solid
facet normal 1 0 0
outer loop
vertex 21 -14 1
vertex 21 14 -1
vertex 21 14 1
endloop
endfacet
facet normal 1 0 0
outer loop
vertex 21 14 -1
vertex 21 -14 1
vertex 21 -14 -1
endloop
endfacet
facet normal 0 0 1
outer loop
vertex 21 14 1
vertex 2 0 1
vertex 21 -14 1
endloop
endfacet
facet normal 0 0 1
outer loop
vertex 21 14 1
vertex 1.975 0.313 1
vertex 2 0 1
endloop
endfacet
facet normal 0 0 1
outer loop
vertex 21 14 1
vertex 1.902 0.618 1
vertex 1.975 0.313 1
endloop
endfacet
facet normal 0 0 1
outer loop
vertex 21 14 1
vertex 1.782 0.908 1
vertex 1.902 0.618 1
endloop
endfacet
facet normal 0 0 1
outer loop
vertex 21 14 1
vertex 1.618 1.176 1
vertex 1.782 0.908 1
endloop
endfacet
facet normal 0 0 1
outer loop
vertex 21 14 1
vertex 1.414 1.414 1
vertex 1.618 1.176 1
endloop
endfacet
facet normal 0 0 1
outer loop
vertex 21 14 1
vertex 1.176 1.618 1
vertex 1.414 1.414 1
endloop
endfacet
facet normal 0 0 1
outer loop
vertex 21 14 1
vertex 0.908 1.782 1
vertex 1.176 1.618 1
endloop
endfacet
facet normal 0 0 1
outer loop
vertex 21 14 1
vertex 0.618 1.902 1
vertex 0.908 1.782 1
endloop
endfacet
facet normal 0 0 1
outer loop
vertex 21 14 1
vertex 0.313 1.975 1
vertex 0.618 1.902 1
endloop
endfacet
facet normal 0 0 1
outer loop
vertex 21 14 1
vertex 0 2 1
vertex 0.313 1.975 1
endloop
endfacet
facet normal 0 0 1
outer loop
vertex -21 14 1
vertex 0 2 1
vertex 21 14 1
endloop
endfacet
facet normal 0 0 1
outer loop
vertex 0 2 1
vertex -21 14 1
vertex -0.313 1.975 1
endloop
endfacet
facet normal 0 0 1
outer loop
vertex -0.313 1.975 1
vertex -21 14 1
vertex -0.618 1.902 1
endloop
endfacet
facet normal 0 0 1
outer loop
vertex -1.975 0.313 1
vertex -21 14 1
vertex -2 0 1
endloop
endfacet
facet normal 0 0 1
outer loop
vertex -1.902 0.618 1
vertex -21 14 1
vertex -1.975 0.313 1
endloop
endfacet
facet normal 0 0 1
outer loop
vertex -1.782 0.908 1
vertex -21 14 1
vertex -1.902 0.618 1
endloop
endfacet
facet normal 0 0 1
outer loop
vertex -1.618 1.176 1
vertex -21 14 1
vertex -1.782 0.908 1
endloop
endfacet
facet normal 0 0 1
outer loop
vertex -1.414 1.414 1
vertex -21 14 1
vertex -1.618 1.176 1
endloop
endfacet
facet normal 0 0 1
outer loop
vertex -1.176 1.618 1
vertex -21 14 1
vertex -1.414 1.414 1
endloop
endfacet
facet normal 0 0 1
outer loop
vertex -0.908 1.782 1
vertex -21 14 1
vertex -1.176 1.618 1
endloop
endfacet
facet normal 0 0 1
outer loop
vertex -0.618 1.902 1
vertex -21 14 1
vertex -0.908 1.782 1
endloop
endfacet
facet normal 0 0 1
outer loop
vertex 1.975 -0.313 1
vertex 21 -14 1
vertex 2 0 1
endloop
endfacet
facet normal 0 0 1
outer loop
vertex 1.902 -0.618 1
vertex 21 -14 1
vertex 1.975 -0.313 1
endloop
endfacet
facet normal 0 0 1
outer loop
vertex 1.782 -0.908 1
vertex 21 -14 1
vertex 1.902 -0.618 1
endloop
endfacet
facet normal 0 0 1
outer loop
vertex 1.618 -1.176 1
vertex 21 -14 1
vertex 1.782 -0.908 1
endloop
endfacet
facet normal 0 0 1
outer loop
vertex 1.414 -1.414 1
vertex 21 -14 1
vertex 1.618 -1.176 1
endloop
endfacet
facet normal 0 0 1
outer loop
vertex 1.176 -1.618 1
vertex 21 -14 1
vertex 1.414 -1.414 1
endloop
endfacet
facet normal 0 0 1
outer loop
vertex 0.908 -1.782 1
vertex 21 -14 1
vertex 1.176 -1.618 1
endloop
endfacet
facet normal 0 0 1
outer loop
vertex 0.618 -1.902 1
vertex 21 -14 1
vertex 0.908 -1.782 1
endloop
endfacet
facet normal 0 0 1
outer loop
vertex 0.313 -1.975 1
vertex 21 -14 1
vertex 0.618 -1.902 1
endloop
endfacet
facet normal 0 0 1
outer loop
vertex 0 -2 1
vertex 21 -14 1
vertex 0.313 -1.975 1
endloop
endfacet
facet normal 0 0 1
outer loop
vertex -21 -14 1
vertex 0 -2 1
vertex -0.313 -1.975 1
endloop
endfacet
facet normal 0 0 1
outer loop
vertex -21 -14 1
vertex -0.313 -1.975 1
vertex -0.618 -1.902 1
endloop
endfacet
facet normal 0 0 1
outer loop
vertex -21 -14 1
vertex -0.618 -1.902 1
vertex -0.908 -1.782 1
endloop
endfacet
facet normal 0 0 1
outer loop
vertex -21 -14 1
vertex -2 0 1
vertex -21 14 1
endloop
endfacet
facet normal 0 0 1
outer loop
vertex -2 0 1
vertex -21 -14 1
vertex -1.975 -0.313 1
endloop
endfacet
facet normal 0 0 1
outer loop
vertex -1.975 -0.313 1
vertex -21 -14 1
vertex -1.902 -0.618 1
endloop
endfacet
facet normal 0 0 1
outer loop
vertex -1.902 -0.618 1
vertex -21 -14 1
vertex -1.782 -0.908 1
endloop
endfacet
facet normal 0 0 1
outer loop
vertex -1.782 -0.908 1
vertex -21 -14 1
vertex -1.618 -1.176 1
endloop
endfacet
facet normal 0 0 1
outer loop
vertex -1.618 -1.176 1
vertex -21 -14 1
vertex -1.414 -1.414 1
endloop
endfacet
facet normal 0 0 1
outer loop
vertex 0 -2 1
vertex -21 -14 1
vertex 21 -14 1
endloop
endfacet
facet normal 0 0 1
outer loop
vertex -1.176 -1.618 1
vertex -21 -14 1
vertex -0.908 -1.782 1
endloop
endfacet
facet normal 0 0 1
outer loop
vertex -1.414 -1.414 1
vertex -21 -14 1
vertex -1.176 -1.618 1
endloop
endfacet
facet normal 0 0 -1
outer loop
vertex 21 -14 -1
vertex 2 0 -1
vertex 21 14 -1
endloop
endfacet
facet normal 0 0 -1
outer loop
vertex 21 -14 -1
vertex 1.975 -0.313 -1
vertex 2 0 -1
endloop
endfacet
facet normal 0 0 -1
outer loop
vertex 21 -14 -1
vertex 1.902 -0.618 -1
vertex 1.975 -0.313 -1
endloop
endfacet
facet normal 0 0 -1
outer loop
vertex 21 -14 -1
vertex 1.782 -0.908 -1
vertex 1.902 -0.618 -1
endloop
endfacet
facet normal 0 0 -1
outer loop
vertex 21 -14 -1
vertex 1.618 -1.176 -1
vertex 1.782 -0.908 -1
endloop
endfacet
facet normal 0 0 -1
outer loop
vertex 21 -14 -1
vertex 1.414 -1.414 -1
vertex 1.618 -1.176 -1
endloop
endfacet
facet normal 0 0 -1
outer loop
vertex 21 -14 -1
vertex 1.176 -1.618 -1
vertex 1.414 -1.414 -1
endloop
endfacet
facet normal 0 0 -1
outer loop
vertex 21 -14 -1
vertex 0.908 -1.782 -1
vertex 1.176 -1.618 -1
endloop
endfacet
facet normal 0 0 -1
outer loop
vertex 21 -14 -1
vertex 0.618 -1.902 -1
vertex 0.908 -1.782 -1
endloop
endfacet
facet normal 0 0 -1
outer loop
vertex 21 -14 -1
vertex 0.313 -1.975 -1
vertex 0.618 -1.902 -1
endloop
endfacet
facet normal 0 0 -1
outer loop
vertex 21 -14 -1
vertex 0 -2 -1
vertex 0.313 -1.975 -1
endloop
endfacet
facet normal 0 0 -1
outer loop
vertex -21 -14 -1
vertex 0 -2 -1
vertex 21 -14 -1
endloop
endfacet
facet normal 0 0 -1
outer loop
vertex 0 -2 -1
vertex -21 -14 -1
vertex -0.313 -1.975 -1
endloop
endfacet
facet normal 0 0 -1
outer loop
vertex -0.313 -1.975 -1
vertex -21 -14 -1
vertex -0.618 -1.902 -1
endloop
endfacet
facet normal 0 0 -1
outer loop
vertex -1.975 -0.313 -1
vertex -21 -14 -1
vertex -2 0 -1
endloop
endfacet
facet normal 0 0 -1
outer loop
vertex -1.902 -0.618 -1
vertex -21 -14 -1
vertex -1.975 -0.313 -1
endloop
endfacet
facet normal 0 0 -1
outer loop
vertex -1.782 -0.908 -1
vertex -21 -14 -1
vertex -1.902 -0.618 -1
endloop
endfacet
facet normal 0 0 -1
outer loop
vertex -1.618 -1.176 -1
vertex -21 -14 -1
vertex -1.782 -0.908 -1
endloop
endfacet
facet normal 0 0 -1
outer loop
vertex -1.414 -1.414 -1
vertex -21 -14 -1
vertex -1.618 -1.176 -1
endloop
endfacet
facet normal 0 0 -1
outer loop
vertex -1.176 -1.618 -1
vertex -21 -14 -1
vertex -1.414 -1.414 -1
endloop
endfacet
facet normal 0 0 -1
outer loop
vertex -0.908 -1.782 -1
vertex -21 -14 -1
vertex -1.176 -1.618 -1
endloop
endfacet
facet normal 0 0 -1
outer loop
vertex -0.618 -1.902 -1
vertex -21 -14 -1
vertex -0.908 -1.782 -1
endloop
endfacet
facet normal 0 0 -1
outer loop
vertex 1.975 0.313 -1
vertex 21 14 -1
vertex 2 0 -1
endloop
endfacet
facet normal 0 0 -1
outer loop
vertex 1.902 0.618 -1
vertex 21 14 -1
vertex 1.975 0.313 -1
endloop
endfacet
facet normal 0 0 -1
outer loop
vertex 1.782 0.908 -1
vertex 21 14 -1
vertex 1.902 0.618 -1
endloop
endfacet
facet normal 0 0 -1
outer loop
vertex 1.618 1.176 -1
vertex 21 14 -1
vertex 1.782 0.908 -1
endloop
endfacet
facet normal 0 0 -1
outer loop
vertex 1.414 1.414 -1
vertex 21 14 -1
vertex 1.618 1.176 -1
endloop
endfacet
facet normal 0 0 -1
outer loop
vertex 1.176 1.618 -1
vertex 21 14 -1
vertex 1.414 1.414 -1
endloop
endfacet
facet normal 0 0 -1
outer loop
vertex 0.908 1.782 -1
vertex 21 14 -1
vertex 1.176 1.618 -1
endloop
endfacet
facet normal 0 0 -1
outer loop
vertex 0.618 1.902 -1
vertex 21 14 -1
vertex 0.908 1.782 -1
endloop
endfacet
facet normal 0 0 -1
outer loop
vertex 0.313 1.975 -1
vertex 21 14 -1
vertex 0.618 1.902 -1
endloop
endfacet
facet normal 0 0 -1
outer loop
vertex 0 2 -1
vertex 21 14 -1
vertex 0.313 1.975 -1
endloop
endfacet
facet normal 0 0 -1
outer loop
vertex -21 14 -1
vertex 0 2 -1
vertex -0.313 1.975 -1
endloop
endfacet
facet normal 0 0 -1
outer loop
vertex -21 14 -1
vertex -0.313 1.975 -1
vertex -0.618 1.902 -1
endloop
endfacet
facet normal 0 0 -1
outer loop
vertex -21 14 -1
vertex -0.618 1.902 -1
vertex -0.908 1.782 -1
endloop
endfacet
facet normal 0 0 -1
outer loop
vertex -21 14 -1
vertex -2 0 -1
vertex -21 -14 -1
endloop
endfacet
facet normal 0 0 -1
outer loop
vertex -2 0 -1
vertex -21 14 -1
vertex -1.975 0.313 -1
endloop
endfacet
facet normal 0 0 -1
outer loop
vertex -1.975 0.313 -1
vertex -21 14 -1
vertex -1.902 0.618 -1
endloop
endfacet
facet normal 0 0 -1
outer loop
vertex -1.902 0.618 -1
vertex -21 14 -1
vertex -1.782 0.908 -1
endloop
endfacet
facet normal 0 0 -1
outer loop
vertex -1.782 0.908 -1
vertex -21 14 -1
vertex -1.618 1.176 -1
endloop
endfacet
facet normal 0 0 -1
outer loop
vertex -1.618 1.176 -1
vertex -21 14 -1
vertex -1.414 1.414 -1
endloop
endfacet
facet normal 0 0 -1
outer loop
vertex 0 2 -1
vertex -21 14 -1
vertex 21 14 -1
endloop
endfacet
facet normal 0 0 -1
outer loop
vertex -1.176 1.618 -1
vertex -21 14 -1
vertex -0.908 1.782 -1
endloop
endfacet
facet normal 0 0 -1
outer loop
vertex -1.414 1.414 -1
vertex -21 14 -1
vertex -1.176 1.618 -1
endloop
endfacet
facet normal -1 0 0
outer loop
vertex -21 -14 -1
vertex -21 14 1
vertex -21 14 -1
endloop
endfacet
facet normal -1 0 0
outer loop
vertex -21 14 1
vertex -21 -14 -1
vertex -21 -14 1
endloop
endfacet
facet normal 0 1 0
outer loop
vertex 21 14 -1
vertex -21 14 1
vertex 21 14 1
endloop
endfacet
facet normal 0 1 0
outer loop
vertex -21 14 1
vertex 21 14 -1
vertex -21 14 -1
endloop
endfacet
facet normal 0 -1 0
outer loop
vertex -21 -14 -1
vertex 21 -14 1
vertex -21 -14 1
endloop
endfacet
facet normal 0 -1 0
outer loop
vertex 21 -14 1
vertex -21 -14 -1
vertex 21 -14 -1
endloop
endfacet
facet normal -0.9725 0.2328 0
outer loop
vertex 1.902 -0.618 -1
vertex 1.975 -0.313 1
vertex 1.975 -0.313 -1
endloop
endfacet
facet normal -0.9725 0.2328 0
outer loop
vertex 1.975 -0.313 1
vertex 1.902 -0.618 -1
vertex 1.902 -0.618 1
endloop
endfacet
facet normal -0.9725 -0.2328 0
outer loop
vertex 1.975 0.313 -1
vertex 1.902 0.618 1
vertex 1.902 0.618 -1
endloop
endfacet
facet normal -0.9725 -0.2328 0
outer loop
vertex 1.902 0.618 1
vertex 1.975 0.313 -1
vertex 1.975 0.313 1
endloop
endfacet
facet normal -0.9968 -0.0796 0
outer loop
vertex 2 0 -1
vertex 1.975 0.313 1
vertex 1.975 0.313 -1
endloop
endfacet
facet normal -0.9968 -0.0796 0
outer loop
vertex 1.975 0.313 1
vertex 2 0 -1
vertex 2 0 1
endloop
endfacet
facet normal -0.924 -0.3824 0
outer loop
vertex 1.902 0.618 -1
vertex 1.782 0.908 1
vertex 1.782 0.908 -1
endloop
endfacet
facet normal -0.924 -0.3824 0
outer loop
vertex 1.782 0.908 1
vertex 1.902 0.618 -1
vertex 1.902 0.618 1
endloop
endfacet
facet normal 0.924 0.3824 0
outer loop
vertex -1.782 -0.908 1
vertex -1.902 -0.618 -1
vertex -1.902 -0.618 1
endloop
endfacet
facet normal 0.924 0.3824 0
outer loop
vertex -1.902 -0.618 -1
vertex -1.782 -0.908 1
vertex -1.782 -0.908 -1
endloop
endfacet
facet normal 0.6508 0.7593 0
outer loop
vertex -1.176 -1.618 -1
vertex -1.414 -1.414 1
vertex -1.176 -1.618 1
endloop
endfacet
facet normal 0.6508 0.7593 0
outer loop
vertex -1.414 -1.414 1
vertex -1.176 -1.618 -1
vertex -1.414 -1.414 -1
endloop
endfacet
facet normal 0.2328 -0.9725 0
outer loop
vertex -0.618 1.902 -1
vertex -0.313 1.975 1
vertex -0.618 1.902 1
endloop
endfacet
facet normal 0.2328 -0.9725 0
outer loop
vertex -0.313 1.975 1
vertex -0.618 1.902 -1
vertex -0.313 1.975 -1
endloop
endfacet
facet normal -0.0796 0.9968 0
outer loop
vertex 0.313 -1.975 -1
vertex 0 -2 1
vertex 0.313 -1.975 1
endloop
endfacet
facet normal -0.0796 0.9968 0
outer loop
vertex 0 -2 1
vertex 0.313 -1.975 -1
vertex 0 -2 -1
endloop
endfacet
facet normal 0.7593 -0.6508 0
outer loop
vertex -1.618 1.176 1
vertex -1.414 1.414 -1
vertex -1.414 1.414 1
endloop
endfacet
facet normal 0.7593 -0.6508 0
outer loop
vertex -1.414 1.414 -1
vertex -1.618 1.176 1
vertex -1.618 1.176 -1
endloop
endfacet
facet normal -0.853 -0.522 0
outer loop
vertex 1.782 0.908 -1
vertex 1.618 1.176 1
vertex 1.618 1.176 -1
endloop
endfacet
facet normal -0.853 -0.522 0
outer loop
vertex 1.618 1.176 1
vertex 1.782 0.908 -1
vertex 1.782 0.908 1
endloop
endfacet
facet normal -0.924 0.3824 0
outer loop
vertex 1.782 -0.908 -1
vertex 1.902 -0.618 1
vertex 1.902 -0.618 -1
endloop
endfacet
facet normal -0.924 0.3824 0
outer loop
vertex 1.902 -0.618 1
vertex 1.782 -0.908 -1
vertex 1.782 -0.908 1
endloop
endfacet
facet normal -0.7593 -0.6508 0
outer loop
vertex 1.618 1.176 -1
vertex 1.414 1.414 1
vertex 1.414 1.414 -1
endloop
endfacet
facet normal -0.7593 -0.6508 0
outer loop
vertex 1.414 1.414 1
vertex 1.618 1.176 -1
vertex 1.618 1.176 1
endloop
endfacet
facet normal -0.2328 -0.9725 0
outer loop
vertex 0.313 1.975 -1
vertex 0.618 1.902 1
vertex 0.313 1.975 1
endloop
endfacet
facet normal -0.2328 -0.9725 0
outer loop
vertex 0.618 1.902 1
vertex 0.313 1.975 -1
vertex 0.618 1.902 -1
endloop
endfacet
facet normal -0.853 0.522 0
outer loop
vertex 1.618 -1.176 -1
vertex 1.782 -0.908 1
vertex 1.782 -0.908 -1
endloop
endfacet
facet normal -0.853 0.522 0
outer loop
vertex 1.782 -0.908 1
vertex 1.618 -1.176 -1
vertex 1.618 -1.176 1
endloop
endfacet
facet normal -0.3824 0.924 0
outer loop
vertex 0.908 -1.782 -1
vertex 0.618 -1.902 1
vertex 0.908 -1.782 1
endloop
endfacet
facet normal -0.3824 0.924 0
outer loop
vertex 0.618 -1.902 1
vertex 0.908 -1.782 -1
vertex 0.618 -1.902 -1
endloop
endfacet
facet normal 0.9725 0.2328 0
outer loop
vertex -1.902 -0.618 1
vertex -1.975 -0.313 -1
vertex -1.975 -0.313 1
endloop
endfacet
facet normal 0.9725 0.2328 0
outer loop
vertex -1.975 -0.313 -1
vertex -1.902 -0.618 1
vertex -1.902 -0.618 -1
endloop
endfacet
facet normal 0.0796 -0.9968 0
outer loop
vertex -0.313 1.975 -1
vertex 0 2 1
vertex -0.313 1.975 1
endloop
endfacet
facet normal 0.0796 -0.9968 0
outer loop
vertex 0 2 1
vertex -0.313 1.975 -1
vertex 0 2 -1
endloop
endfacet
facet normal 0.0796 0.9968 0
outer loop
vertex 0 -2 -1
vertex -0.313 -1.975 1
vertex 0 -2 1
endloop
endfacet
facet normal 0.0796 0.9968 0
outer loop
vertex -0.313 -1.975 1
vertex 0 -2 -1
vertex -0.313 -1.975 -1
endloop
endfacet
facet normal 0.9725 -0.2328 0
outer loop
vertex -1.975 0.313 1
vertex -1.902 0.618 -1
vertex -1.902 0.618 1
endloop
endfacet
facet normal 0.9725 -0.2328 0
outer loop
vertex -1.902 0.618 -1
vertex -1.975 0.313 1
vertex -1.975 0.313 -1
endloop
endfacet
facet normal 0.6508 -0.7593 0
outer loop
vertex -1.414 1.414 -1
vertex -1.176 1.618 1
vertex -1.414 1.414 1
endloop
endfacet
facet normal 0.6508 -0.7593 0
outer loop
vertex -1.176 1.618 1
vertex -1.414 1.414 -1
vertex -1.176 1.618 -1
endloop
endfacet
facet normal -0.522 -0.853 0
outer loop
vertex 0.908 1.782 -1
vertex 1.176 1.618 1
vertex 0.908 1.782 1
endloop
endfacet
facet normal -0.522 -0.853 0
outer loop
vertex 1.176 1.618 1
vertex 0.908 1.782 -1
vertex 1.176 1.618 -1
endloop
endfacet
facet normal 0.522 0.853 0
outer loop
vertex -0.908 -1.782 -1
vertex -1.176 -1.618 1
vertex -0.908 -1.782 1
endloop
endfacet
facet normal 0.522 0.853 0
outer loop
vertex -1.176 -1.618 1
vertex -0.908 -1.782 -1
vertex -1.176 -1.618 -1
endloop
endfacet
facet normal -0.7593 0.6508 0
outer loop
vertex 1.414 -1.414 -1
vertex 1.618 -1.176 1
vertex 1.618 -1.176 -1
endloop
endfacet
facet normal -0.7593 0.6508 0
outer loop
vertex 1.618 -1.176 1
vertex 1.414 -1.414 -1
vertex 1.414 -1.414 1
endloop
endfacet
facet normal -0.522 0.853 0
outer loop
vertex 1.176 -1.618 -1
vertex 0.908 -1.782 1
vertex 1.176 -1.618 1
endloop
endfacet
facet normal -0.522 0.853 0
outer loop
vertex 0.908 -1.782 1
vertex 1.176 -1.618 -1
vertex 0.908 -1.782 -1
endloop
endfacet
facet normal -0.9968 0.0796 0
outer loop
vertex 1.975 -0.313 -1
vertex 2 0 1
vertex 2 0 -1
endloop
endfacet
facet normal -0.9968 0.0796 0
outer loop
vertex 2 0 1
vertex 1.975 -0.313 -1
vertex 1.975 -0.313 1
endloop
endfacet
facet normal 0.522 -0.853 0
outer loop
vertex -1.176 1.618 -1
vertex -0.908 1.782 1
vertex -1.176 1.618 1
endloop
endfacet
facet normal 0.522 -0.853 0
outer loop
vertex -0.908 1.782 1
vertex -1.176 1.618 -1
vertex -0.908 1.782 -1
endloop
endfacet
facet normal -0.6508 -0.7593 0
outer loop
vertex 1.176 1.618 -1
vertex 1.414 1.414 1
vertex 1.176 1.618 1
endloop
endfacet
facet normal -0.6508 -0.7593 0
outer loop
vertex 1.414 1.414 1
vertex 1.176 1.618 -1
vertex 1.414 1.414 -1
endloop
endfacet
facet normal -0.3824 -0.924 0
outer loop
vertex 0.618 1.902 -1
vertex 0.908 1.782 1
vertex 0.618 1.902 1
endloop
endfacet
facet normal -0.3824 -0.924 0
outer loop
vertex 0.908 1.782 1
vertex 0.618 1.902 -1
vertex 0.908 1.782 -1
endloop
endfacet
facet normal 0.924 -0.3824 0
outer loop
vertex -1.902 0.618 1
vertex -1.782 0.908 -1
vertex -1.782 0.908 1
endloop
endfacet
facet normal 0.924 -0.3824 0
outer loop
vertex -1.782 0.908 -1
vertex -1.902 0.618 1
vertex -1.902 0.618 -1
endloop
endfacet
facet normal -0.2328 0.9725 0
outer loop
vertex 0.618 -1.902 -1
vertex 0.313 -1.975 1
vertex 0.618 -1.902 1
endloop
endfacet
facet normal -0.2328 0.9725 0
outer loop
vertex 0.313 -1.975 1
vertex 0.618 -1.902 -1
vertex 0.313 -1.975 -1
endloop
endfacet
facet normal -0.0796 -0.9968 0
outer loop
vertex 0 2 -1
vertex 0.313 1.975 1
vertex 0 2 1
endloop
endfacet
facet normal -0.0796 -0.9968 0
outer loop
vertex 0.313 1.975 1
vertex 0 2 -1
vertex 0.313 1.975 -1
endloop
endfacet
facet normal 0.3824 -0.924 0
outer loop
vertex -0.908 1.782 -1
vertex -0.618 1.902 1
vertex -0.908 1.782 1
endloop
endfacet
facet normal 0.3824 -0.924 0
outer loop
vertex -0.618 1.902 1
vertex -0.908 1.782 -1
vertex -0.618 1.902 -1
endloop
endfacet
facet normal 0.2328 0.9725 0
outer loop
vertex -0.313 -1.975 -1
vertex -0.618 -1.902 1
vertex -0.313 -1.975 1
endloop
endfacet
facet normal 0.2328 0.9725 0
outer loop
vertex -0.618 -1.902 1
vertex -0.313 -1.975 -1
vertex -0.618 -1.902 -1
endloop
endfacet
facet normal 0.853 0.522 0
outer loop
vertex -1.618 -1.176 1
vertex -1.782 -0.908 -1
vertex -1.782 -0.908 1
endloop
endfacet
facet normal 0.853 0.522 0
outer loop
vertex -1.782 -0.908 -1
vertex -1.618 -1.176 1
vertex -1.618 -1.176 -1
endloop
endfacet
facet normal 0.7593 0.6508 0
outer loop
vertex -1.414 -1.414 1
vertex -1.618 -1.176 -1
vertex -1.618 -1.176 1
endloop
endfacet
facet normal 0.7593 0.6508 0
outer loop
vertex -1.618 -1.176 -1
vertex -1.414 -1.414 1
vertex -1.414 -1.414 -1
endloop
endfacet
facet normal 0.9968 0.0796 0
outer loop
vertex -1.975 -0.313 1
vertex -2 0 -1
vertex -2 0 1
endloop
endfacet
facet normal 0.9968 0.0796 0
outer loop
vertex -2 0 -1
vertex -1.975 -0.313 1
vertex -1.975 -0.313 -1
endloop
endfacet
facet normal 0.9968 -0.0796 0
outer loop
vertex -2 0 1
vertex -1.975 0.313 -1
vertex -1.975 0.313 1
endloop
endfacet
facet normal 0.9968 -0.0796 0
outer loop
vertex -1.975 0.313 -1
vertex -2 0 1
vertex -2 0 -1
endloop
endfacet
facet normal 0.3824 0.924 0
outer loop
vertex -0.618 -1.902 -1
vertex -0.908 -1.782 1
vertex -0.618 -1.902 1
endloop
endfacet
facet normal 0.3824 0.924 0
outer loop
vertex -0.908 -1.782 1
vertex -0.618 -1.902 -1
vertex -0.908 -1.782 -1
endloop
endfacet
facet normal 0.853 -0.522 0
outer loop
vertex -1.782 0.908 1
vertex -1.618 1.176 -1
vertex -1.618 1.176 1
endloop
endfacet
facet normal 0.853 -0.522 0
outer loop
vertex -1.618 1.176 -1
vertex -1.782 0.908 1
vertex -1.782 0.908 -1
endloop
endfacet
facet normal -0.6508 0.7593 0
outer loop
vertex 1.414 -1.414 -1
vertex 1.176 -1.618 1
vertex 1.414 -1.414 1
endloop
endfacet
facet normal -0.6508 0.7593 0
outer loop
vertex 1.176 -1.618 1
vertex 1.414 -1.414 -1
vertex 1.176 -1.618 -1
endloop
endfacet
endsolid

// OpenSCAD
difference(){
    cube([42,28,2], center=true);
    
    cylinder(h=10, r=2., $fn=40, center=true);
}
